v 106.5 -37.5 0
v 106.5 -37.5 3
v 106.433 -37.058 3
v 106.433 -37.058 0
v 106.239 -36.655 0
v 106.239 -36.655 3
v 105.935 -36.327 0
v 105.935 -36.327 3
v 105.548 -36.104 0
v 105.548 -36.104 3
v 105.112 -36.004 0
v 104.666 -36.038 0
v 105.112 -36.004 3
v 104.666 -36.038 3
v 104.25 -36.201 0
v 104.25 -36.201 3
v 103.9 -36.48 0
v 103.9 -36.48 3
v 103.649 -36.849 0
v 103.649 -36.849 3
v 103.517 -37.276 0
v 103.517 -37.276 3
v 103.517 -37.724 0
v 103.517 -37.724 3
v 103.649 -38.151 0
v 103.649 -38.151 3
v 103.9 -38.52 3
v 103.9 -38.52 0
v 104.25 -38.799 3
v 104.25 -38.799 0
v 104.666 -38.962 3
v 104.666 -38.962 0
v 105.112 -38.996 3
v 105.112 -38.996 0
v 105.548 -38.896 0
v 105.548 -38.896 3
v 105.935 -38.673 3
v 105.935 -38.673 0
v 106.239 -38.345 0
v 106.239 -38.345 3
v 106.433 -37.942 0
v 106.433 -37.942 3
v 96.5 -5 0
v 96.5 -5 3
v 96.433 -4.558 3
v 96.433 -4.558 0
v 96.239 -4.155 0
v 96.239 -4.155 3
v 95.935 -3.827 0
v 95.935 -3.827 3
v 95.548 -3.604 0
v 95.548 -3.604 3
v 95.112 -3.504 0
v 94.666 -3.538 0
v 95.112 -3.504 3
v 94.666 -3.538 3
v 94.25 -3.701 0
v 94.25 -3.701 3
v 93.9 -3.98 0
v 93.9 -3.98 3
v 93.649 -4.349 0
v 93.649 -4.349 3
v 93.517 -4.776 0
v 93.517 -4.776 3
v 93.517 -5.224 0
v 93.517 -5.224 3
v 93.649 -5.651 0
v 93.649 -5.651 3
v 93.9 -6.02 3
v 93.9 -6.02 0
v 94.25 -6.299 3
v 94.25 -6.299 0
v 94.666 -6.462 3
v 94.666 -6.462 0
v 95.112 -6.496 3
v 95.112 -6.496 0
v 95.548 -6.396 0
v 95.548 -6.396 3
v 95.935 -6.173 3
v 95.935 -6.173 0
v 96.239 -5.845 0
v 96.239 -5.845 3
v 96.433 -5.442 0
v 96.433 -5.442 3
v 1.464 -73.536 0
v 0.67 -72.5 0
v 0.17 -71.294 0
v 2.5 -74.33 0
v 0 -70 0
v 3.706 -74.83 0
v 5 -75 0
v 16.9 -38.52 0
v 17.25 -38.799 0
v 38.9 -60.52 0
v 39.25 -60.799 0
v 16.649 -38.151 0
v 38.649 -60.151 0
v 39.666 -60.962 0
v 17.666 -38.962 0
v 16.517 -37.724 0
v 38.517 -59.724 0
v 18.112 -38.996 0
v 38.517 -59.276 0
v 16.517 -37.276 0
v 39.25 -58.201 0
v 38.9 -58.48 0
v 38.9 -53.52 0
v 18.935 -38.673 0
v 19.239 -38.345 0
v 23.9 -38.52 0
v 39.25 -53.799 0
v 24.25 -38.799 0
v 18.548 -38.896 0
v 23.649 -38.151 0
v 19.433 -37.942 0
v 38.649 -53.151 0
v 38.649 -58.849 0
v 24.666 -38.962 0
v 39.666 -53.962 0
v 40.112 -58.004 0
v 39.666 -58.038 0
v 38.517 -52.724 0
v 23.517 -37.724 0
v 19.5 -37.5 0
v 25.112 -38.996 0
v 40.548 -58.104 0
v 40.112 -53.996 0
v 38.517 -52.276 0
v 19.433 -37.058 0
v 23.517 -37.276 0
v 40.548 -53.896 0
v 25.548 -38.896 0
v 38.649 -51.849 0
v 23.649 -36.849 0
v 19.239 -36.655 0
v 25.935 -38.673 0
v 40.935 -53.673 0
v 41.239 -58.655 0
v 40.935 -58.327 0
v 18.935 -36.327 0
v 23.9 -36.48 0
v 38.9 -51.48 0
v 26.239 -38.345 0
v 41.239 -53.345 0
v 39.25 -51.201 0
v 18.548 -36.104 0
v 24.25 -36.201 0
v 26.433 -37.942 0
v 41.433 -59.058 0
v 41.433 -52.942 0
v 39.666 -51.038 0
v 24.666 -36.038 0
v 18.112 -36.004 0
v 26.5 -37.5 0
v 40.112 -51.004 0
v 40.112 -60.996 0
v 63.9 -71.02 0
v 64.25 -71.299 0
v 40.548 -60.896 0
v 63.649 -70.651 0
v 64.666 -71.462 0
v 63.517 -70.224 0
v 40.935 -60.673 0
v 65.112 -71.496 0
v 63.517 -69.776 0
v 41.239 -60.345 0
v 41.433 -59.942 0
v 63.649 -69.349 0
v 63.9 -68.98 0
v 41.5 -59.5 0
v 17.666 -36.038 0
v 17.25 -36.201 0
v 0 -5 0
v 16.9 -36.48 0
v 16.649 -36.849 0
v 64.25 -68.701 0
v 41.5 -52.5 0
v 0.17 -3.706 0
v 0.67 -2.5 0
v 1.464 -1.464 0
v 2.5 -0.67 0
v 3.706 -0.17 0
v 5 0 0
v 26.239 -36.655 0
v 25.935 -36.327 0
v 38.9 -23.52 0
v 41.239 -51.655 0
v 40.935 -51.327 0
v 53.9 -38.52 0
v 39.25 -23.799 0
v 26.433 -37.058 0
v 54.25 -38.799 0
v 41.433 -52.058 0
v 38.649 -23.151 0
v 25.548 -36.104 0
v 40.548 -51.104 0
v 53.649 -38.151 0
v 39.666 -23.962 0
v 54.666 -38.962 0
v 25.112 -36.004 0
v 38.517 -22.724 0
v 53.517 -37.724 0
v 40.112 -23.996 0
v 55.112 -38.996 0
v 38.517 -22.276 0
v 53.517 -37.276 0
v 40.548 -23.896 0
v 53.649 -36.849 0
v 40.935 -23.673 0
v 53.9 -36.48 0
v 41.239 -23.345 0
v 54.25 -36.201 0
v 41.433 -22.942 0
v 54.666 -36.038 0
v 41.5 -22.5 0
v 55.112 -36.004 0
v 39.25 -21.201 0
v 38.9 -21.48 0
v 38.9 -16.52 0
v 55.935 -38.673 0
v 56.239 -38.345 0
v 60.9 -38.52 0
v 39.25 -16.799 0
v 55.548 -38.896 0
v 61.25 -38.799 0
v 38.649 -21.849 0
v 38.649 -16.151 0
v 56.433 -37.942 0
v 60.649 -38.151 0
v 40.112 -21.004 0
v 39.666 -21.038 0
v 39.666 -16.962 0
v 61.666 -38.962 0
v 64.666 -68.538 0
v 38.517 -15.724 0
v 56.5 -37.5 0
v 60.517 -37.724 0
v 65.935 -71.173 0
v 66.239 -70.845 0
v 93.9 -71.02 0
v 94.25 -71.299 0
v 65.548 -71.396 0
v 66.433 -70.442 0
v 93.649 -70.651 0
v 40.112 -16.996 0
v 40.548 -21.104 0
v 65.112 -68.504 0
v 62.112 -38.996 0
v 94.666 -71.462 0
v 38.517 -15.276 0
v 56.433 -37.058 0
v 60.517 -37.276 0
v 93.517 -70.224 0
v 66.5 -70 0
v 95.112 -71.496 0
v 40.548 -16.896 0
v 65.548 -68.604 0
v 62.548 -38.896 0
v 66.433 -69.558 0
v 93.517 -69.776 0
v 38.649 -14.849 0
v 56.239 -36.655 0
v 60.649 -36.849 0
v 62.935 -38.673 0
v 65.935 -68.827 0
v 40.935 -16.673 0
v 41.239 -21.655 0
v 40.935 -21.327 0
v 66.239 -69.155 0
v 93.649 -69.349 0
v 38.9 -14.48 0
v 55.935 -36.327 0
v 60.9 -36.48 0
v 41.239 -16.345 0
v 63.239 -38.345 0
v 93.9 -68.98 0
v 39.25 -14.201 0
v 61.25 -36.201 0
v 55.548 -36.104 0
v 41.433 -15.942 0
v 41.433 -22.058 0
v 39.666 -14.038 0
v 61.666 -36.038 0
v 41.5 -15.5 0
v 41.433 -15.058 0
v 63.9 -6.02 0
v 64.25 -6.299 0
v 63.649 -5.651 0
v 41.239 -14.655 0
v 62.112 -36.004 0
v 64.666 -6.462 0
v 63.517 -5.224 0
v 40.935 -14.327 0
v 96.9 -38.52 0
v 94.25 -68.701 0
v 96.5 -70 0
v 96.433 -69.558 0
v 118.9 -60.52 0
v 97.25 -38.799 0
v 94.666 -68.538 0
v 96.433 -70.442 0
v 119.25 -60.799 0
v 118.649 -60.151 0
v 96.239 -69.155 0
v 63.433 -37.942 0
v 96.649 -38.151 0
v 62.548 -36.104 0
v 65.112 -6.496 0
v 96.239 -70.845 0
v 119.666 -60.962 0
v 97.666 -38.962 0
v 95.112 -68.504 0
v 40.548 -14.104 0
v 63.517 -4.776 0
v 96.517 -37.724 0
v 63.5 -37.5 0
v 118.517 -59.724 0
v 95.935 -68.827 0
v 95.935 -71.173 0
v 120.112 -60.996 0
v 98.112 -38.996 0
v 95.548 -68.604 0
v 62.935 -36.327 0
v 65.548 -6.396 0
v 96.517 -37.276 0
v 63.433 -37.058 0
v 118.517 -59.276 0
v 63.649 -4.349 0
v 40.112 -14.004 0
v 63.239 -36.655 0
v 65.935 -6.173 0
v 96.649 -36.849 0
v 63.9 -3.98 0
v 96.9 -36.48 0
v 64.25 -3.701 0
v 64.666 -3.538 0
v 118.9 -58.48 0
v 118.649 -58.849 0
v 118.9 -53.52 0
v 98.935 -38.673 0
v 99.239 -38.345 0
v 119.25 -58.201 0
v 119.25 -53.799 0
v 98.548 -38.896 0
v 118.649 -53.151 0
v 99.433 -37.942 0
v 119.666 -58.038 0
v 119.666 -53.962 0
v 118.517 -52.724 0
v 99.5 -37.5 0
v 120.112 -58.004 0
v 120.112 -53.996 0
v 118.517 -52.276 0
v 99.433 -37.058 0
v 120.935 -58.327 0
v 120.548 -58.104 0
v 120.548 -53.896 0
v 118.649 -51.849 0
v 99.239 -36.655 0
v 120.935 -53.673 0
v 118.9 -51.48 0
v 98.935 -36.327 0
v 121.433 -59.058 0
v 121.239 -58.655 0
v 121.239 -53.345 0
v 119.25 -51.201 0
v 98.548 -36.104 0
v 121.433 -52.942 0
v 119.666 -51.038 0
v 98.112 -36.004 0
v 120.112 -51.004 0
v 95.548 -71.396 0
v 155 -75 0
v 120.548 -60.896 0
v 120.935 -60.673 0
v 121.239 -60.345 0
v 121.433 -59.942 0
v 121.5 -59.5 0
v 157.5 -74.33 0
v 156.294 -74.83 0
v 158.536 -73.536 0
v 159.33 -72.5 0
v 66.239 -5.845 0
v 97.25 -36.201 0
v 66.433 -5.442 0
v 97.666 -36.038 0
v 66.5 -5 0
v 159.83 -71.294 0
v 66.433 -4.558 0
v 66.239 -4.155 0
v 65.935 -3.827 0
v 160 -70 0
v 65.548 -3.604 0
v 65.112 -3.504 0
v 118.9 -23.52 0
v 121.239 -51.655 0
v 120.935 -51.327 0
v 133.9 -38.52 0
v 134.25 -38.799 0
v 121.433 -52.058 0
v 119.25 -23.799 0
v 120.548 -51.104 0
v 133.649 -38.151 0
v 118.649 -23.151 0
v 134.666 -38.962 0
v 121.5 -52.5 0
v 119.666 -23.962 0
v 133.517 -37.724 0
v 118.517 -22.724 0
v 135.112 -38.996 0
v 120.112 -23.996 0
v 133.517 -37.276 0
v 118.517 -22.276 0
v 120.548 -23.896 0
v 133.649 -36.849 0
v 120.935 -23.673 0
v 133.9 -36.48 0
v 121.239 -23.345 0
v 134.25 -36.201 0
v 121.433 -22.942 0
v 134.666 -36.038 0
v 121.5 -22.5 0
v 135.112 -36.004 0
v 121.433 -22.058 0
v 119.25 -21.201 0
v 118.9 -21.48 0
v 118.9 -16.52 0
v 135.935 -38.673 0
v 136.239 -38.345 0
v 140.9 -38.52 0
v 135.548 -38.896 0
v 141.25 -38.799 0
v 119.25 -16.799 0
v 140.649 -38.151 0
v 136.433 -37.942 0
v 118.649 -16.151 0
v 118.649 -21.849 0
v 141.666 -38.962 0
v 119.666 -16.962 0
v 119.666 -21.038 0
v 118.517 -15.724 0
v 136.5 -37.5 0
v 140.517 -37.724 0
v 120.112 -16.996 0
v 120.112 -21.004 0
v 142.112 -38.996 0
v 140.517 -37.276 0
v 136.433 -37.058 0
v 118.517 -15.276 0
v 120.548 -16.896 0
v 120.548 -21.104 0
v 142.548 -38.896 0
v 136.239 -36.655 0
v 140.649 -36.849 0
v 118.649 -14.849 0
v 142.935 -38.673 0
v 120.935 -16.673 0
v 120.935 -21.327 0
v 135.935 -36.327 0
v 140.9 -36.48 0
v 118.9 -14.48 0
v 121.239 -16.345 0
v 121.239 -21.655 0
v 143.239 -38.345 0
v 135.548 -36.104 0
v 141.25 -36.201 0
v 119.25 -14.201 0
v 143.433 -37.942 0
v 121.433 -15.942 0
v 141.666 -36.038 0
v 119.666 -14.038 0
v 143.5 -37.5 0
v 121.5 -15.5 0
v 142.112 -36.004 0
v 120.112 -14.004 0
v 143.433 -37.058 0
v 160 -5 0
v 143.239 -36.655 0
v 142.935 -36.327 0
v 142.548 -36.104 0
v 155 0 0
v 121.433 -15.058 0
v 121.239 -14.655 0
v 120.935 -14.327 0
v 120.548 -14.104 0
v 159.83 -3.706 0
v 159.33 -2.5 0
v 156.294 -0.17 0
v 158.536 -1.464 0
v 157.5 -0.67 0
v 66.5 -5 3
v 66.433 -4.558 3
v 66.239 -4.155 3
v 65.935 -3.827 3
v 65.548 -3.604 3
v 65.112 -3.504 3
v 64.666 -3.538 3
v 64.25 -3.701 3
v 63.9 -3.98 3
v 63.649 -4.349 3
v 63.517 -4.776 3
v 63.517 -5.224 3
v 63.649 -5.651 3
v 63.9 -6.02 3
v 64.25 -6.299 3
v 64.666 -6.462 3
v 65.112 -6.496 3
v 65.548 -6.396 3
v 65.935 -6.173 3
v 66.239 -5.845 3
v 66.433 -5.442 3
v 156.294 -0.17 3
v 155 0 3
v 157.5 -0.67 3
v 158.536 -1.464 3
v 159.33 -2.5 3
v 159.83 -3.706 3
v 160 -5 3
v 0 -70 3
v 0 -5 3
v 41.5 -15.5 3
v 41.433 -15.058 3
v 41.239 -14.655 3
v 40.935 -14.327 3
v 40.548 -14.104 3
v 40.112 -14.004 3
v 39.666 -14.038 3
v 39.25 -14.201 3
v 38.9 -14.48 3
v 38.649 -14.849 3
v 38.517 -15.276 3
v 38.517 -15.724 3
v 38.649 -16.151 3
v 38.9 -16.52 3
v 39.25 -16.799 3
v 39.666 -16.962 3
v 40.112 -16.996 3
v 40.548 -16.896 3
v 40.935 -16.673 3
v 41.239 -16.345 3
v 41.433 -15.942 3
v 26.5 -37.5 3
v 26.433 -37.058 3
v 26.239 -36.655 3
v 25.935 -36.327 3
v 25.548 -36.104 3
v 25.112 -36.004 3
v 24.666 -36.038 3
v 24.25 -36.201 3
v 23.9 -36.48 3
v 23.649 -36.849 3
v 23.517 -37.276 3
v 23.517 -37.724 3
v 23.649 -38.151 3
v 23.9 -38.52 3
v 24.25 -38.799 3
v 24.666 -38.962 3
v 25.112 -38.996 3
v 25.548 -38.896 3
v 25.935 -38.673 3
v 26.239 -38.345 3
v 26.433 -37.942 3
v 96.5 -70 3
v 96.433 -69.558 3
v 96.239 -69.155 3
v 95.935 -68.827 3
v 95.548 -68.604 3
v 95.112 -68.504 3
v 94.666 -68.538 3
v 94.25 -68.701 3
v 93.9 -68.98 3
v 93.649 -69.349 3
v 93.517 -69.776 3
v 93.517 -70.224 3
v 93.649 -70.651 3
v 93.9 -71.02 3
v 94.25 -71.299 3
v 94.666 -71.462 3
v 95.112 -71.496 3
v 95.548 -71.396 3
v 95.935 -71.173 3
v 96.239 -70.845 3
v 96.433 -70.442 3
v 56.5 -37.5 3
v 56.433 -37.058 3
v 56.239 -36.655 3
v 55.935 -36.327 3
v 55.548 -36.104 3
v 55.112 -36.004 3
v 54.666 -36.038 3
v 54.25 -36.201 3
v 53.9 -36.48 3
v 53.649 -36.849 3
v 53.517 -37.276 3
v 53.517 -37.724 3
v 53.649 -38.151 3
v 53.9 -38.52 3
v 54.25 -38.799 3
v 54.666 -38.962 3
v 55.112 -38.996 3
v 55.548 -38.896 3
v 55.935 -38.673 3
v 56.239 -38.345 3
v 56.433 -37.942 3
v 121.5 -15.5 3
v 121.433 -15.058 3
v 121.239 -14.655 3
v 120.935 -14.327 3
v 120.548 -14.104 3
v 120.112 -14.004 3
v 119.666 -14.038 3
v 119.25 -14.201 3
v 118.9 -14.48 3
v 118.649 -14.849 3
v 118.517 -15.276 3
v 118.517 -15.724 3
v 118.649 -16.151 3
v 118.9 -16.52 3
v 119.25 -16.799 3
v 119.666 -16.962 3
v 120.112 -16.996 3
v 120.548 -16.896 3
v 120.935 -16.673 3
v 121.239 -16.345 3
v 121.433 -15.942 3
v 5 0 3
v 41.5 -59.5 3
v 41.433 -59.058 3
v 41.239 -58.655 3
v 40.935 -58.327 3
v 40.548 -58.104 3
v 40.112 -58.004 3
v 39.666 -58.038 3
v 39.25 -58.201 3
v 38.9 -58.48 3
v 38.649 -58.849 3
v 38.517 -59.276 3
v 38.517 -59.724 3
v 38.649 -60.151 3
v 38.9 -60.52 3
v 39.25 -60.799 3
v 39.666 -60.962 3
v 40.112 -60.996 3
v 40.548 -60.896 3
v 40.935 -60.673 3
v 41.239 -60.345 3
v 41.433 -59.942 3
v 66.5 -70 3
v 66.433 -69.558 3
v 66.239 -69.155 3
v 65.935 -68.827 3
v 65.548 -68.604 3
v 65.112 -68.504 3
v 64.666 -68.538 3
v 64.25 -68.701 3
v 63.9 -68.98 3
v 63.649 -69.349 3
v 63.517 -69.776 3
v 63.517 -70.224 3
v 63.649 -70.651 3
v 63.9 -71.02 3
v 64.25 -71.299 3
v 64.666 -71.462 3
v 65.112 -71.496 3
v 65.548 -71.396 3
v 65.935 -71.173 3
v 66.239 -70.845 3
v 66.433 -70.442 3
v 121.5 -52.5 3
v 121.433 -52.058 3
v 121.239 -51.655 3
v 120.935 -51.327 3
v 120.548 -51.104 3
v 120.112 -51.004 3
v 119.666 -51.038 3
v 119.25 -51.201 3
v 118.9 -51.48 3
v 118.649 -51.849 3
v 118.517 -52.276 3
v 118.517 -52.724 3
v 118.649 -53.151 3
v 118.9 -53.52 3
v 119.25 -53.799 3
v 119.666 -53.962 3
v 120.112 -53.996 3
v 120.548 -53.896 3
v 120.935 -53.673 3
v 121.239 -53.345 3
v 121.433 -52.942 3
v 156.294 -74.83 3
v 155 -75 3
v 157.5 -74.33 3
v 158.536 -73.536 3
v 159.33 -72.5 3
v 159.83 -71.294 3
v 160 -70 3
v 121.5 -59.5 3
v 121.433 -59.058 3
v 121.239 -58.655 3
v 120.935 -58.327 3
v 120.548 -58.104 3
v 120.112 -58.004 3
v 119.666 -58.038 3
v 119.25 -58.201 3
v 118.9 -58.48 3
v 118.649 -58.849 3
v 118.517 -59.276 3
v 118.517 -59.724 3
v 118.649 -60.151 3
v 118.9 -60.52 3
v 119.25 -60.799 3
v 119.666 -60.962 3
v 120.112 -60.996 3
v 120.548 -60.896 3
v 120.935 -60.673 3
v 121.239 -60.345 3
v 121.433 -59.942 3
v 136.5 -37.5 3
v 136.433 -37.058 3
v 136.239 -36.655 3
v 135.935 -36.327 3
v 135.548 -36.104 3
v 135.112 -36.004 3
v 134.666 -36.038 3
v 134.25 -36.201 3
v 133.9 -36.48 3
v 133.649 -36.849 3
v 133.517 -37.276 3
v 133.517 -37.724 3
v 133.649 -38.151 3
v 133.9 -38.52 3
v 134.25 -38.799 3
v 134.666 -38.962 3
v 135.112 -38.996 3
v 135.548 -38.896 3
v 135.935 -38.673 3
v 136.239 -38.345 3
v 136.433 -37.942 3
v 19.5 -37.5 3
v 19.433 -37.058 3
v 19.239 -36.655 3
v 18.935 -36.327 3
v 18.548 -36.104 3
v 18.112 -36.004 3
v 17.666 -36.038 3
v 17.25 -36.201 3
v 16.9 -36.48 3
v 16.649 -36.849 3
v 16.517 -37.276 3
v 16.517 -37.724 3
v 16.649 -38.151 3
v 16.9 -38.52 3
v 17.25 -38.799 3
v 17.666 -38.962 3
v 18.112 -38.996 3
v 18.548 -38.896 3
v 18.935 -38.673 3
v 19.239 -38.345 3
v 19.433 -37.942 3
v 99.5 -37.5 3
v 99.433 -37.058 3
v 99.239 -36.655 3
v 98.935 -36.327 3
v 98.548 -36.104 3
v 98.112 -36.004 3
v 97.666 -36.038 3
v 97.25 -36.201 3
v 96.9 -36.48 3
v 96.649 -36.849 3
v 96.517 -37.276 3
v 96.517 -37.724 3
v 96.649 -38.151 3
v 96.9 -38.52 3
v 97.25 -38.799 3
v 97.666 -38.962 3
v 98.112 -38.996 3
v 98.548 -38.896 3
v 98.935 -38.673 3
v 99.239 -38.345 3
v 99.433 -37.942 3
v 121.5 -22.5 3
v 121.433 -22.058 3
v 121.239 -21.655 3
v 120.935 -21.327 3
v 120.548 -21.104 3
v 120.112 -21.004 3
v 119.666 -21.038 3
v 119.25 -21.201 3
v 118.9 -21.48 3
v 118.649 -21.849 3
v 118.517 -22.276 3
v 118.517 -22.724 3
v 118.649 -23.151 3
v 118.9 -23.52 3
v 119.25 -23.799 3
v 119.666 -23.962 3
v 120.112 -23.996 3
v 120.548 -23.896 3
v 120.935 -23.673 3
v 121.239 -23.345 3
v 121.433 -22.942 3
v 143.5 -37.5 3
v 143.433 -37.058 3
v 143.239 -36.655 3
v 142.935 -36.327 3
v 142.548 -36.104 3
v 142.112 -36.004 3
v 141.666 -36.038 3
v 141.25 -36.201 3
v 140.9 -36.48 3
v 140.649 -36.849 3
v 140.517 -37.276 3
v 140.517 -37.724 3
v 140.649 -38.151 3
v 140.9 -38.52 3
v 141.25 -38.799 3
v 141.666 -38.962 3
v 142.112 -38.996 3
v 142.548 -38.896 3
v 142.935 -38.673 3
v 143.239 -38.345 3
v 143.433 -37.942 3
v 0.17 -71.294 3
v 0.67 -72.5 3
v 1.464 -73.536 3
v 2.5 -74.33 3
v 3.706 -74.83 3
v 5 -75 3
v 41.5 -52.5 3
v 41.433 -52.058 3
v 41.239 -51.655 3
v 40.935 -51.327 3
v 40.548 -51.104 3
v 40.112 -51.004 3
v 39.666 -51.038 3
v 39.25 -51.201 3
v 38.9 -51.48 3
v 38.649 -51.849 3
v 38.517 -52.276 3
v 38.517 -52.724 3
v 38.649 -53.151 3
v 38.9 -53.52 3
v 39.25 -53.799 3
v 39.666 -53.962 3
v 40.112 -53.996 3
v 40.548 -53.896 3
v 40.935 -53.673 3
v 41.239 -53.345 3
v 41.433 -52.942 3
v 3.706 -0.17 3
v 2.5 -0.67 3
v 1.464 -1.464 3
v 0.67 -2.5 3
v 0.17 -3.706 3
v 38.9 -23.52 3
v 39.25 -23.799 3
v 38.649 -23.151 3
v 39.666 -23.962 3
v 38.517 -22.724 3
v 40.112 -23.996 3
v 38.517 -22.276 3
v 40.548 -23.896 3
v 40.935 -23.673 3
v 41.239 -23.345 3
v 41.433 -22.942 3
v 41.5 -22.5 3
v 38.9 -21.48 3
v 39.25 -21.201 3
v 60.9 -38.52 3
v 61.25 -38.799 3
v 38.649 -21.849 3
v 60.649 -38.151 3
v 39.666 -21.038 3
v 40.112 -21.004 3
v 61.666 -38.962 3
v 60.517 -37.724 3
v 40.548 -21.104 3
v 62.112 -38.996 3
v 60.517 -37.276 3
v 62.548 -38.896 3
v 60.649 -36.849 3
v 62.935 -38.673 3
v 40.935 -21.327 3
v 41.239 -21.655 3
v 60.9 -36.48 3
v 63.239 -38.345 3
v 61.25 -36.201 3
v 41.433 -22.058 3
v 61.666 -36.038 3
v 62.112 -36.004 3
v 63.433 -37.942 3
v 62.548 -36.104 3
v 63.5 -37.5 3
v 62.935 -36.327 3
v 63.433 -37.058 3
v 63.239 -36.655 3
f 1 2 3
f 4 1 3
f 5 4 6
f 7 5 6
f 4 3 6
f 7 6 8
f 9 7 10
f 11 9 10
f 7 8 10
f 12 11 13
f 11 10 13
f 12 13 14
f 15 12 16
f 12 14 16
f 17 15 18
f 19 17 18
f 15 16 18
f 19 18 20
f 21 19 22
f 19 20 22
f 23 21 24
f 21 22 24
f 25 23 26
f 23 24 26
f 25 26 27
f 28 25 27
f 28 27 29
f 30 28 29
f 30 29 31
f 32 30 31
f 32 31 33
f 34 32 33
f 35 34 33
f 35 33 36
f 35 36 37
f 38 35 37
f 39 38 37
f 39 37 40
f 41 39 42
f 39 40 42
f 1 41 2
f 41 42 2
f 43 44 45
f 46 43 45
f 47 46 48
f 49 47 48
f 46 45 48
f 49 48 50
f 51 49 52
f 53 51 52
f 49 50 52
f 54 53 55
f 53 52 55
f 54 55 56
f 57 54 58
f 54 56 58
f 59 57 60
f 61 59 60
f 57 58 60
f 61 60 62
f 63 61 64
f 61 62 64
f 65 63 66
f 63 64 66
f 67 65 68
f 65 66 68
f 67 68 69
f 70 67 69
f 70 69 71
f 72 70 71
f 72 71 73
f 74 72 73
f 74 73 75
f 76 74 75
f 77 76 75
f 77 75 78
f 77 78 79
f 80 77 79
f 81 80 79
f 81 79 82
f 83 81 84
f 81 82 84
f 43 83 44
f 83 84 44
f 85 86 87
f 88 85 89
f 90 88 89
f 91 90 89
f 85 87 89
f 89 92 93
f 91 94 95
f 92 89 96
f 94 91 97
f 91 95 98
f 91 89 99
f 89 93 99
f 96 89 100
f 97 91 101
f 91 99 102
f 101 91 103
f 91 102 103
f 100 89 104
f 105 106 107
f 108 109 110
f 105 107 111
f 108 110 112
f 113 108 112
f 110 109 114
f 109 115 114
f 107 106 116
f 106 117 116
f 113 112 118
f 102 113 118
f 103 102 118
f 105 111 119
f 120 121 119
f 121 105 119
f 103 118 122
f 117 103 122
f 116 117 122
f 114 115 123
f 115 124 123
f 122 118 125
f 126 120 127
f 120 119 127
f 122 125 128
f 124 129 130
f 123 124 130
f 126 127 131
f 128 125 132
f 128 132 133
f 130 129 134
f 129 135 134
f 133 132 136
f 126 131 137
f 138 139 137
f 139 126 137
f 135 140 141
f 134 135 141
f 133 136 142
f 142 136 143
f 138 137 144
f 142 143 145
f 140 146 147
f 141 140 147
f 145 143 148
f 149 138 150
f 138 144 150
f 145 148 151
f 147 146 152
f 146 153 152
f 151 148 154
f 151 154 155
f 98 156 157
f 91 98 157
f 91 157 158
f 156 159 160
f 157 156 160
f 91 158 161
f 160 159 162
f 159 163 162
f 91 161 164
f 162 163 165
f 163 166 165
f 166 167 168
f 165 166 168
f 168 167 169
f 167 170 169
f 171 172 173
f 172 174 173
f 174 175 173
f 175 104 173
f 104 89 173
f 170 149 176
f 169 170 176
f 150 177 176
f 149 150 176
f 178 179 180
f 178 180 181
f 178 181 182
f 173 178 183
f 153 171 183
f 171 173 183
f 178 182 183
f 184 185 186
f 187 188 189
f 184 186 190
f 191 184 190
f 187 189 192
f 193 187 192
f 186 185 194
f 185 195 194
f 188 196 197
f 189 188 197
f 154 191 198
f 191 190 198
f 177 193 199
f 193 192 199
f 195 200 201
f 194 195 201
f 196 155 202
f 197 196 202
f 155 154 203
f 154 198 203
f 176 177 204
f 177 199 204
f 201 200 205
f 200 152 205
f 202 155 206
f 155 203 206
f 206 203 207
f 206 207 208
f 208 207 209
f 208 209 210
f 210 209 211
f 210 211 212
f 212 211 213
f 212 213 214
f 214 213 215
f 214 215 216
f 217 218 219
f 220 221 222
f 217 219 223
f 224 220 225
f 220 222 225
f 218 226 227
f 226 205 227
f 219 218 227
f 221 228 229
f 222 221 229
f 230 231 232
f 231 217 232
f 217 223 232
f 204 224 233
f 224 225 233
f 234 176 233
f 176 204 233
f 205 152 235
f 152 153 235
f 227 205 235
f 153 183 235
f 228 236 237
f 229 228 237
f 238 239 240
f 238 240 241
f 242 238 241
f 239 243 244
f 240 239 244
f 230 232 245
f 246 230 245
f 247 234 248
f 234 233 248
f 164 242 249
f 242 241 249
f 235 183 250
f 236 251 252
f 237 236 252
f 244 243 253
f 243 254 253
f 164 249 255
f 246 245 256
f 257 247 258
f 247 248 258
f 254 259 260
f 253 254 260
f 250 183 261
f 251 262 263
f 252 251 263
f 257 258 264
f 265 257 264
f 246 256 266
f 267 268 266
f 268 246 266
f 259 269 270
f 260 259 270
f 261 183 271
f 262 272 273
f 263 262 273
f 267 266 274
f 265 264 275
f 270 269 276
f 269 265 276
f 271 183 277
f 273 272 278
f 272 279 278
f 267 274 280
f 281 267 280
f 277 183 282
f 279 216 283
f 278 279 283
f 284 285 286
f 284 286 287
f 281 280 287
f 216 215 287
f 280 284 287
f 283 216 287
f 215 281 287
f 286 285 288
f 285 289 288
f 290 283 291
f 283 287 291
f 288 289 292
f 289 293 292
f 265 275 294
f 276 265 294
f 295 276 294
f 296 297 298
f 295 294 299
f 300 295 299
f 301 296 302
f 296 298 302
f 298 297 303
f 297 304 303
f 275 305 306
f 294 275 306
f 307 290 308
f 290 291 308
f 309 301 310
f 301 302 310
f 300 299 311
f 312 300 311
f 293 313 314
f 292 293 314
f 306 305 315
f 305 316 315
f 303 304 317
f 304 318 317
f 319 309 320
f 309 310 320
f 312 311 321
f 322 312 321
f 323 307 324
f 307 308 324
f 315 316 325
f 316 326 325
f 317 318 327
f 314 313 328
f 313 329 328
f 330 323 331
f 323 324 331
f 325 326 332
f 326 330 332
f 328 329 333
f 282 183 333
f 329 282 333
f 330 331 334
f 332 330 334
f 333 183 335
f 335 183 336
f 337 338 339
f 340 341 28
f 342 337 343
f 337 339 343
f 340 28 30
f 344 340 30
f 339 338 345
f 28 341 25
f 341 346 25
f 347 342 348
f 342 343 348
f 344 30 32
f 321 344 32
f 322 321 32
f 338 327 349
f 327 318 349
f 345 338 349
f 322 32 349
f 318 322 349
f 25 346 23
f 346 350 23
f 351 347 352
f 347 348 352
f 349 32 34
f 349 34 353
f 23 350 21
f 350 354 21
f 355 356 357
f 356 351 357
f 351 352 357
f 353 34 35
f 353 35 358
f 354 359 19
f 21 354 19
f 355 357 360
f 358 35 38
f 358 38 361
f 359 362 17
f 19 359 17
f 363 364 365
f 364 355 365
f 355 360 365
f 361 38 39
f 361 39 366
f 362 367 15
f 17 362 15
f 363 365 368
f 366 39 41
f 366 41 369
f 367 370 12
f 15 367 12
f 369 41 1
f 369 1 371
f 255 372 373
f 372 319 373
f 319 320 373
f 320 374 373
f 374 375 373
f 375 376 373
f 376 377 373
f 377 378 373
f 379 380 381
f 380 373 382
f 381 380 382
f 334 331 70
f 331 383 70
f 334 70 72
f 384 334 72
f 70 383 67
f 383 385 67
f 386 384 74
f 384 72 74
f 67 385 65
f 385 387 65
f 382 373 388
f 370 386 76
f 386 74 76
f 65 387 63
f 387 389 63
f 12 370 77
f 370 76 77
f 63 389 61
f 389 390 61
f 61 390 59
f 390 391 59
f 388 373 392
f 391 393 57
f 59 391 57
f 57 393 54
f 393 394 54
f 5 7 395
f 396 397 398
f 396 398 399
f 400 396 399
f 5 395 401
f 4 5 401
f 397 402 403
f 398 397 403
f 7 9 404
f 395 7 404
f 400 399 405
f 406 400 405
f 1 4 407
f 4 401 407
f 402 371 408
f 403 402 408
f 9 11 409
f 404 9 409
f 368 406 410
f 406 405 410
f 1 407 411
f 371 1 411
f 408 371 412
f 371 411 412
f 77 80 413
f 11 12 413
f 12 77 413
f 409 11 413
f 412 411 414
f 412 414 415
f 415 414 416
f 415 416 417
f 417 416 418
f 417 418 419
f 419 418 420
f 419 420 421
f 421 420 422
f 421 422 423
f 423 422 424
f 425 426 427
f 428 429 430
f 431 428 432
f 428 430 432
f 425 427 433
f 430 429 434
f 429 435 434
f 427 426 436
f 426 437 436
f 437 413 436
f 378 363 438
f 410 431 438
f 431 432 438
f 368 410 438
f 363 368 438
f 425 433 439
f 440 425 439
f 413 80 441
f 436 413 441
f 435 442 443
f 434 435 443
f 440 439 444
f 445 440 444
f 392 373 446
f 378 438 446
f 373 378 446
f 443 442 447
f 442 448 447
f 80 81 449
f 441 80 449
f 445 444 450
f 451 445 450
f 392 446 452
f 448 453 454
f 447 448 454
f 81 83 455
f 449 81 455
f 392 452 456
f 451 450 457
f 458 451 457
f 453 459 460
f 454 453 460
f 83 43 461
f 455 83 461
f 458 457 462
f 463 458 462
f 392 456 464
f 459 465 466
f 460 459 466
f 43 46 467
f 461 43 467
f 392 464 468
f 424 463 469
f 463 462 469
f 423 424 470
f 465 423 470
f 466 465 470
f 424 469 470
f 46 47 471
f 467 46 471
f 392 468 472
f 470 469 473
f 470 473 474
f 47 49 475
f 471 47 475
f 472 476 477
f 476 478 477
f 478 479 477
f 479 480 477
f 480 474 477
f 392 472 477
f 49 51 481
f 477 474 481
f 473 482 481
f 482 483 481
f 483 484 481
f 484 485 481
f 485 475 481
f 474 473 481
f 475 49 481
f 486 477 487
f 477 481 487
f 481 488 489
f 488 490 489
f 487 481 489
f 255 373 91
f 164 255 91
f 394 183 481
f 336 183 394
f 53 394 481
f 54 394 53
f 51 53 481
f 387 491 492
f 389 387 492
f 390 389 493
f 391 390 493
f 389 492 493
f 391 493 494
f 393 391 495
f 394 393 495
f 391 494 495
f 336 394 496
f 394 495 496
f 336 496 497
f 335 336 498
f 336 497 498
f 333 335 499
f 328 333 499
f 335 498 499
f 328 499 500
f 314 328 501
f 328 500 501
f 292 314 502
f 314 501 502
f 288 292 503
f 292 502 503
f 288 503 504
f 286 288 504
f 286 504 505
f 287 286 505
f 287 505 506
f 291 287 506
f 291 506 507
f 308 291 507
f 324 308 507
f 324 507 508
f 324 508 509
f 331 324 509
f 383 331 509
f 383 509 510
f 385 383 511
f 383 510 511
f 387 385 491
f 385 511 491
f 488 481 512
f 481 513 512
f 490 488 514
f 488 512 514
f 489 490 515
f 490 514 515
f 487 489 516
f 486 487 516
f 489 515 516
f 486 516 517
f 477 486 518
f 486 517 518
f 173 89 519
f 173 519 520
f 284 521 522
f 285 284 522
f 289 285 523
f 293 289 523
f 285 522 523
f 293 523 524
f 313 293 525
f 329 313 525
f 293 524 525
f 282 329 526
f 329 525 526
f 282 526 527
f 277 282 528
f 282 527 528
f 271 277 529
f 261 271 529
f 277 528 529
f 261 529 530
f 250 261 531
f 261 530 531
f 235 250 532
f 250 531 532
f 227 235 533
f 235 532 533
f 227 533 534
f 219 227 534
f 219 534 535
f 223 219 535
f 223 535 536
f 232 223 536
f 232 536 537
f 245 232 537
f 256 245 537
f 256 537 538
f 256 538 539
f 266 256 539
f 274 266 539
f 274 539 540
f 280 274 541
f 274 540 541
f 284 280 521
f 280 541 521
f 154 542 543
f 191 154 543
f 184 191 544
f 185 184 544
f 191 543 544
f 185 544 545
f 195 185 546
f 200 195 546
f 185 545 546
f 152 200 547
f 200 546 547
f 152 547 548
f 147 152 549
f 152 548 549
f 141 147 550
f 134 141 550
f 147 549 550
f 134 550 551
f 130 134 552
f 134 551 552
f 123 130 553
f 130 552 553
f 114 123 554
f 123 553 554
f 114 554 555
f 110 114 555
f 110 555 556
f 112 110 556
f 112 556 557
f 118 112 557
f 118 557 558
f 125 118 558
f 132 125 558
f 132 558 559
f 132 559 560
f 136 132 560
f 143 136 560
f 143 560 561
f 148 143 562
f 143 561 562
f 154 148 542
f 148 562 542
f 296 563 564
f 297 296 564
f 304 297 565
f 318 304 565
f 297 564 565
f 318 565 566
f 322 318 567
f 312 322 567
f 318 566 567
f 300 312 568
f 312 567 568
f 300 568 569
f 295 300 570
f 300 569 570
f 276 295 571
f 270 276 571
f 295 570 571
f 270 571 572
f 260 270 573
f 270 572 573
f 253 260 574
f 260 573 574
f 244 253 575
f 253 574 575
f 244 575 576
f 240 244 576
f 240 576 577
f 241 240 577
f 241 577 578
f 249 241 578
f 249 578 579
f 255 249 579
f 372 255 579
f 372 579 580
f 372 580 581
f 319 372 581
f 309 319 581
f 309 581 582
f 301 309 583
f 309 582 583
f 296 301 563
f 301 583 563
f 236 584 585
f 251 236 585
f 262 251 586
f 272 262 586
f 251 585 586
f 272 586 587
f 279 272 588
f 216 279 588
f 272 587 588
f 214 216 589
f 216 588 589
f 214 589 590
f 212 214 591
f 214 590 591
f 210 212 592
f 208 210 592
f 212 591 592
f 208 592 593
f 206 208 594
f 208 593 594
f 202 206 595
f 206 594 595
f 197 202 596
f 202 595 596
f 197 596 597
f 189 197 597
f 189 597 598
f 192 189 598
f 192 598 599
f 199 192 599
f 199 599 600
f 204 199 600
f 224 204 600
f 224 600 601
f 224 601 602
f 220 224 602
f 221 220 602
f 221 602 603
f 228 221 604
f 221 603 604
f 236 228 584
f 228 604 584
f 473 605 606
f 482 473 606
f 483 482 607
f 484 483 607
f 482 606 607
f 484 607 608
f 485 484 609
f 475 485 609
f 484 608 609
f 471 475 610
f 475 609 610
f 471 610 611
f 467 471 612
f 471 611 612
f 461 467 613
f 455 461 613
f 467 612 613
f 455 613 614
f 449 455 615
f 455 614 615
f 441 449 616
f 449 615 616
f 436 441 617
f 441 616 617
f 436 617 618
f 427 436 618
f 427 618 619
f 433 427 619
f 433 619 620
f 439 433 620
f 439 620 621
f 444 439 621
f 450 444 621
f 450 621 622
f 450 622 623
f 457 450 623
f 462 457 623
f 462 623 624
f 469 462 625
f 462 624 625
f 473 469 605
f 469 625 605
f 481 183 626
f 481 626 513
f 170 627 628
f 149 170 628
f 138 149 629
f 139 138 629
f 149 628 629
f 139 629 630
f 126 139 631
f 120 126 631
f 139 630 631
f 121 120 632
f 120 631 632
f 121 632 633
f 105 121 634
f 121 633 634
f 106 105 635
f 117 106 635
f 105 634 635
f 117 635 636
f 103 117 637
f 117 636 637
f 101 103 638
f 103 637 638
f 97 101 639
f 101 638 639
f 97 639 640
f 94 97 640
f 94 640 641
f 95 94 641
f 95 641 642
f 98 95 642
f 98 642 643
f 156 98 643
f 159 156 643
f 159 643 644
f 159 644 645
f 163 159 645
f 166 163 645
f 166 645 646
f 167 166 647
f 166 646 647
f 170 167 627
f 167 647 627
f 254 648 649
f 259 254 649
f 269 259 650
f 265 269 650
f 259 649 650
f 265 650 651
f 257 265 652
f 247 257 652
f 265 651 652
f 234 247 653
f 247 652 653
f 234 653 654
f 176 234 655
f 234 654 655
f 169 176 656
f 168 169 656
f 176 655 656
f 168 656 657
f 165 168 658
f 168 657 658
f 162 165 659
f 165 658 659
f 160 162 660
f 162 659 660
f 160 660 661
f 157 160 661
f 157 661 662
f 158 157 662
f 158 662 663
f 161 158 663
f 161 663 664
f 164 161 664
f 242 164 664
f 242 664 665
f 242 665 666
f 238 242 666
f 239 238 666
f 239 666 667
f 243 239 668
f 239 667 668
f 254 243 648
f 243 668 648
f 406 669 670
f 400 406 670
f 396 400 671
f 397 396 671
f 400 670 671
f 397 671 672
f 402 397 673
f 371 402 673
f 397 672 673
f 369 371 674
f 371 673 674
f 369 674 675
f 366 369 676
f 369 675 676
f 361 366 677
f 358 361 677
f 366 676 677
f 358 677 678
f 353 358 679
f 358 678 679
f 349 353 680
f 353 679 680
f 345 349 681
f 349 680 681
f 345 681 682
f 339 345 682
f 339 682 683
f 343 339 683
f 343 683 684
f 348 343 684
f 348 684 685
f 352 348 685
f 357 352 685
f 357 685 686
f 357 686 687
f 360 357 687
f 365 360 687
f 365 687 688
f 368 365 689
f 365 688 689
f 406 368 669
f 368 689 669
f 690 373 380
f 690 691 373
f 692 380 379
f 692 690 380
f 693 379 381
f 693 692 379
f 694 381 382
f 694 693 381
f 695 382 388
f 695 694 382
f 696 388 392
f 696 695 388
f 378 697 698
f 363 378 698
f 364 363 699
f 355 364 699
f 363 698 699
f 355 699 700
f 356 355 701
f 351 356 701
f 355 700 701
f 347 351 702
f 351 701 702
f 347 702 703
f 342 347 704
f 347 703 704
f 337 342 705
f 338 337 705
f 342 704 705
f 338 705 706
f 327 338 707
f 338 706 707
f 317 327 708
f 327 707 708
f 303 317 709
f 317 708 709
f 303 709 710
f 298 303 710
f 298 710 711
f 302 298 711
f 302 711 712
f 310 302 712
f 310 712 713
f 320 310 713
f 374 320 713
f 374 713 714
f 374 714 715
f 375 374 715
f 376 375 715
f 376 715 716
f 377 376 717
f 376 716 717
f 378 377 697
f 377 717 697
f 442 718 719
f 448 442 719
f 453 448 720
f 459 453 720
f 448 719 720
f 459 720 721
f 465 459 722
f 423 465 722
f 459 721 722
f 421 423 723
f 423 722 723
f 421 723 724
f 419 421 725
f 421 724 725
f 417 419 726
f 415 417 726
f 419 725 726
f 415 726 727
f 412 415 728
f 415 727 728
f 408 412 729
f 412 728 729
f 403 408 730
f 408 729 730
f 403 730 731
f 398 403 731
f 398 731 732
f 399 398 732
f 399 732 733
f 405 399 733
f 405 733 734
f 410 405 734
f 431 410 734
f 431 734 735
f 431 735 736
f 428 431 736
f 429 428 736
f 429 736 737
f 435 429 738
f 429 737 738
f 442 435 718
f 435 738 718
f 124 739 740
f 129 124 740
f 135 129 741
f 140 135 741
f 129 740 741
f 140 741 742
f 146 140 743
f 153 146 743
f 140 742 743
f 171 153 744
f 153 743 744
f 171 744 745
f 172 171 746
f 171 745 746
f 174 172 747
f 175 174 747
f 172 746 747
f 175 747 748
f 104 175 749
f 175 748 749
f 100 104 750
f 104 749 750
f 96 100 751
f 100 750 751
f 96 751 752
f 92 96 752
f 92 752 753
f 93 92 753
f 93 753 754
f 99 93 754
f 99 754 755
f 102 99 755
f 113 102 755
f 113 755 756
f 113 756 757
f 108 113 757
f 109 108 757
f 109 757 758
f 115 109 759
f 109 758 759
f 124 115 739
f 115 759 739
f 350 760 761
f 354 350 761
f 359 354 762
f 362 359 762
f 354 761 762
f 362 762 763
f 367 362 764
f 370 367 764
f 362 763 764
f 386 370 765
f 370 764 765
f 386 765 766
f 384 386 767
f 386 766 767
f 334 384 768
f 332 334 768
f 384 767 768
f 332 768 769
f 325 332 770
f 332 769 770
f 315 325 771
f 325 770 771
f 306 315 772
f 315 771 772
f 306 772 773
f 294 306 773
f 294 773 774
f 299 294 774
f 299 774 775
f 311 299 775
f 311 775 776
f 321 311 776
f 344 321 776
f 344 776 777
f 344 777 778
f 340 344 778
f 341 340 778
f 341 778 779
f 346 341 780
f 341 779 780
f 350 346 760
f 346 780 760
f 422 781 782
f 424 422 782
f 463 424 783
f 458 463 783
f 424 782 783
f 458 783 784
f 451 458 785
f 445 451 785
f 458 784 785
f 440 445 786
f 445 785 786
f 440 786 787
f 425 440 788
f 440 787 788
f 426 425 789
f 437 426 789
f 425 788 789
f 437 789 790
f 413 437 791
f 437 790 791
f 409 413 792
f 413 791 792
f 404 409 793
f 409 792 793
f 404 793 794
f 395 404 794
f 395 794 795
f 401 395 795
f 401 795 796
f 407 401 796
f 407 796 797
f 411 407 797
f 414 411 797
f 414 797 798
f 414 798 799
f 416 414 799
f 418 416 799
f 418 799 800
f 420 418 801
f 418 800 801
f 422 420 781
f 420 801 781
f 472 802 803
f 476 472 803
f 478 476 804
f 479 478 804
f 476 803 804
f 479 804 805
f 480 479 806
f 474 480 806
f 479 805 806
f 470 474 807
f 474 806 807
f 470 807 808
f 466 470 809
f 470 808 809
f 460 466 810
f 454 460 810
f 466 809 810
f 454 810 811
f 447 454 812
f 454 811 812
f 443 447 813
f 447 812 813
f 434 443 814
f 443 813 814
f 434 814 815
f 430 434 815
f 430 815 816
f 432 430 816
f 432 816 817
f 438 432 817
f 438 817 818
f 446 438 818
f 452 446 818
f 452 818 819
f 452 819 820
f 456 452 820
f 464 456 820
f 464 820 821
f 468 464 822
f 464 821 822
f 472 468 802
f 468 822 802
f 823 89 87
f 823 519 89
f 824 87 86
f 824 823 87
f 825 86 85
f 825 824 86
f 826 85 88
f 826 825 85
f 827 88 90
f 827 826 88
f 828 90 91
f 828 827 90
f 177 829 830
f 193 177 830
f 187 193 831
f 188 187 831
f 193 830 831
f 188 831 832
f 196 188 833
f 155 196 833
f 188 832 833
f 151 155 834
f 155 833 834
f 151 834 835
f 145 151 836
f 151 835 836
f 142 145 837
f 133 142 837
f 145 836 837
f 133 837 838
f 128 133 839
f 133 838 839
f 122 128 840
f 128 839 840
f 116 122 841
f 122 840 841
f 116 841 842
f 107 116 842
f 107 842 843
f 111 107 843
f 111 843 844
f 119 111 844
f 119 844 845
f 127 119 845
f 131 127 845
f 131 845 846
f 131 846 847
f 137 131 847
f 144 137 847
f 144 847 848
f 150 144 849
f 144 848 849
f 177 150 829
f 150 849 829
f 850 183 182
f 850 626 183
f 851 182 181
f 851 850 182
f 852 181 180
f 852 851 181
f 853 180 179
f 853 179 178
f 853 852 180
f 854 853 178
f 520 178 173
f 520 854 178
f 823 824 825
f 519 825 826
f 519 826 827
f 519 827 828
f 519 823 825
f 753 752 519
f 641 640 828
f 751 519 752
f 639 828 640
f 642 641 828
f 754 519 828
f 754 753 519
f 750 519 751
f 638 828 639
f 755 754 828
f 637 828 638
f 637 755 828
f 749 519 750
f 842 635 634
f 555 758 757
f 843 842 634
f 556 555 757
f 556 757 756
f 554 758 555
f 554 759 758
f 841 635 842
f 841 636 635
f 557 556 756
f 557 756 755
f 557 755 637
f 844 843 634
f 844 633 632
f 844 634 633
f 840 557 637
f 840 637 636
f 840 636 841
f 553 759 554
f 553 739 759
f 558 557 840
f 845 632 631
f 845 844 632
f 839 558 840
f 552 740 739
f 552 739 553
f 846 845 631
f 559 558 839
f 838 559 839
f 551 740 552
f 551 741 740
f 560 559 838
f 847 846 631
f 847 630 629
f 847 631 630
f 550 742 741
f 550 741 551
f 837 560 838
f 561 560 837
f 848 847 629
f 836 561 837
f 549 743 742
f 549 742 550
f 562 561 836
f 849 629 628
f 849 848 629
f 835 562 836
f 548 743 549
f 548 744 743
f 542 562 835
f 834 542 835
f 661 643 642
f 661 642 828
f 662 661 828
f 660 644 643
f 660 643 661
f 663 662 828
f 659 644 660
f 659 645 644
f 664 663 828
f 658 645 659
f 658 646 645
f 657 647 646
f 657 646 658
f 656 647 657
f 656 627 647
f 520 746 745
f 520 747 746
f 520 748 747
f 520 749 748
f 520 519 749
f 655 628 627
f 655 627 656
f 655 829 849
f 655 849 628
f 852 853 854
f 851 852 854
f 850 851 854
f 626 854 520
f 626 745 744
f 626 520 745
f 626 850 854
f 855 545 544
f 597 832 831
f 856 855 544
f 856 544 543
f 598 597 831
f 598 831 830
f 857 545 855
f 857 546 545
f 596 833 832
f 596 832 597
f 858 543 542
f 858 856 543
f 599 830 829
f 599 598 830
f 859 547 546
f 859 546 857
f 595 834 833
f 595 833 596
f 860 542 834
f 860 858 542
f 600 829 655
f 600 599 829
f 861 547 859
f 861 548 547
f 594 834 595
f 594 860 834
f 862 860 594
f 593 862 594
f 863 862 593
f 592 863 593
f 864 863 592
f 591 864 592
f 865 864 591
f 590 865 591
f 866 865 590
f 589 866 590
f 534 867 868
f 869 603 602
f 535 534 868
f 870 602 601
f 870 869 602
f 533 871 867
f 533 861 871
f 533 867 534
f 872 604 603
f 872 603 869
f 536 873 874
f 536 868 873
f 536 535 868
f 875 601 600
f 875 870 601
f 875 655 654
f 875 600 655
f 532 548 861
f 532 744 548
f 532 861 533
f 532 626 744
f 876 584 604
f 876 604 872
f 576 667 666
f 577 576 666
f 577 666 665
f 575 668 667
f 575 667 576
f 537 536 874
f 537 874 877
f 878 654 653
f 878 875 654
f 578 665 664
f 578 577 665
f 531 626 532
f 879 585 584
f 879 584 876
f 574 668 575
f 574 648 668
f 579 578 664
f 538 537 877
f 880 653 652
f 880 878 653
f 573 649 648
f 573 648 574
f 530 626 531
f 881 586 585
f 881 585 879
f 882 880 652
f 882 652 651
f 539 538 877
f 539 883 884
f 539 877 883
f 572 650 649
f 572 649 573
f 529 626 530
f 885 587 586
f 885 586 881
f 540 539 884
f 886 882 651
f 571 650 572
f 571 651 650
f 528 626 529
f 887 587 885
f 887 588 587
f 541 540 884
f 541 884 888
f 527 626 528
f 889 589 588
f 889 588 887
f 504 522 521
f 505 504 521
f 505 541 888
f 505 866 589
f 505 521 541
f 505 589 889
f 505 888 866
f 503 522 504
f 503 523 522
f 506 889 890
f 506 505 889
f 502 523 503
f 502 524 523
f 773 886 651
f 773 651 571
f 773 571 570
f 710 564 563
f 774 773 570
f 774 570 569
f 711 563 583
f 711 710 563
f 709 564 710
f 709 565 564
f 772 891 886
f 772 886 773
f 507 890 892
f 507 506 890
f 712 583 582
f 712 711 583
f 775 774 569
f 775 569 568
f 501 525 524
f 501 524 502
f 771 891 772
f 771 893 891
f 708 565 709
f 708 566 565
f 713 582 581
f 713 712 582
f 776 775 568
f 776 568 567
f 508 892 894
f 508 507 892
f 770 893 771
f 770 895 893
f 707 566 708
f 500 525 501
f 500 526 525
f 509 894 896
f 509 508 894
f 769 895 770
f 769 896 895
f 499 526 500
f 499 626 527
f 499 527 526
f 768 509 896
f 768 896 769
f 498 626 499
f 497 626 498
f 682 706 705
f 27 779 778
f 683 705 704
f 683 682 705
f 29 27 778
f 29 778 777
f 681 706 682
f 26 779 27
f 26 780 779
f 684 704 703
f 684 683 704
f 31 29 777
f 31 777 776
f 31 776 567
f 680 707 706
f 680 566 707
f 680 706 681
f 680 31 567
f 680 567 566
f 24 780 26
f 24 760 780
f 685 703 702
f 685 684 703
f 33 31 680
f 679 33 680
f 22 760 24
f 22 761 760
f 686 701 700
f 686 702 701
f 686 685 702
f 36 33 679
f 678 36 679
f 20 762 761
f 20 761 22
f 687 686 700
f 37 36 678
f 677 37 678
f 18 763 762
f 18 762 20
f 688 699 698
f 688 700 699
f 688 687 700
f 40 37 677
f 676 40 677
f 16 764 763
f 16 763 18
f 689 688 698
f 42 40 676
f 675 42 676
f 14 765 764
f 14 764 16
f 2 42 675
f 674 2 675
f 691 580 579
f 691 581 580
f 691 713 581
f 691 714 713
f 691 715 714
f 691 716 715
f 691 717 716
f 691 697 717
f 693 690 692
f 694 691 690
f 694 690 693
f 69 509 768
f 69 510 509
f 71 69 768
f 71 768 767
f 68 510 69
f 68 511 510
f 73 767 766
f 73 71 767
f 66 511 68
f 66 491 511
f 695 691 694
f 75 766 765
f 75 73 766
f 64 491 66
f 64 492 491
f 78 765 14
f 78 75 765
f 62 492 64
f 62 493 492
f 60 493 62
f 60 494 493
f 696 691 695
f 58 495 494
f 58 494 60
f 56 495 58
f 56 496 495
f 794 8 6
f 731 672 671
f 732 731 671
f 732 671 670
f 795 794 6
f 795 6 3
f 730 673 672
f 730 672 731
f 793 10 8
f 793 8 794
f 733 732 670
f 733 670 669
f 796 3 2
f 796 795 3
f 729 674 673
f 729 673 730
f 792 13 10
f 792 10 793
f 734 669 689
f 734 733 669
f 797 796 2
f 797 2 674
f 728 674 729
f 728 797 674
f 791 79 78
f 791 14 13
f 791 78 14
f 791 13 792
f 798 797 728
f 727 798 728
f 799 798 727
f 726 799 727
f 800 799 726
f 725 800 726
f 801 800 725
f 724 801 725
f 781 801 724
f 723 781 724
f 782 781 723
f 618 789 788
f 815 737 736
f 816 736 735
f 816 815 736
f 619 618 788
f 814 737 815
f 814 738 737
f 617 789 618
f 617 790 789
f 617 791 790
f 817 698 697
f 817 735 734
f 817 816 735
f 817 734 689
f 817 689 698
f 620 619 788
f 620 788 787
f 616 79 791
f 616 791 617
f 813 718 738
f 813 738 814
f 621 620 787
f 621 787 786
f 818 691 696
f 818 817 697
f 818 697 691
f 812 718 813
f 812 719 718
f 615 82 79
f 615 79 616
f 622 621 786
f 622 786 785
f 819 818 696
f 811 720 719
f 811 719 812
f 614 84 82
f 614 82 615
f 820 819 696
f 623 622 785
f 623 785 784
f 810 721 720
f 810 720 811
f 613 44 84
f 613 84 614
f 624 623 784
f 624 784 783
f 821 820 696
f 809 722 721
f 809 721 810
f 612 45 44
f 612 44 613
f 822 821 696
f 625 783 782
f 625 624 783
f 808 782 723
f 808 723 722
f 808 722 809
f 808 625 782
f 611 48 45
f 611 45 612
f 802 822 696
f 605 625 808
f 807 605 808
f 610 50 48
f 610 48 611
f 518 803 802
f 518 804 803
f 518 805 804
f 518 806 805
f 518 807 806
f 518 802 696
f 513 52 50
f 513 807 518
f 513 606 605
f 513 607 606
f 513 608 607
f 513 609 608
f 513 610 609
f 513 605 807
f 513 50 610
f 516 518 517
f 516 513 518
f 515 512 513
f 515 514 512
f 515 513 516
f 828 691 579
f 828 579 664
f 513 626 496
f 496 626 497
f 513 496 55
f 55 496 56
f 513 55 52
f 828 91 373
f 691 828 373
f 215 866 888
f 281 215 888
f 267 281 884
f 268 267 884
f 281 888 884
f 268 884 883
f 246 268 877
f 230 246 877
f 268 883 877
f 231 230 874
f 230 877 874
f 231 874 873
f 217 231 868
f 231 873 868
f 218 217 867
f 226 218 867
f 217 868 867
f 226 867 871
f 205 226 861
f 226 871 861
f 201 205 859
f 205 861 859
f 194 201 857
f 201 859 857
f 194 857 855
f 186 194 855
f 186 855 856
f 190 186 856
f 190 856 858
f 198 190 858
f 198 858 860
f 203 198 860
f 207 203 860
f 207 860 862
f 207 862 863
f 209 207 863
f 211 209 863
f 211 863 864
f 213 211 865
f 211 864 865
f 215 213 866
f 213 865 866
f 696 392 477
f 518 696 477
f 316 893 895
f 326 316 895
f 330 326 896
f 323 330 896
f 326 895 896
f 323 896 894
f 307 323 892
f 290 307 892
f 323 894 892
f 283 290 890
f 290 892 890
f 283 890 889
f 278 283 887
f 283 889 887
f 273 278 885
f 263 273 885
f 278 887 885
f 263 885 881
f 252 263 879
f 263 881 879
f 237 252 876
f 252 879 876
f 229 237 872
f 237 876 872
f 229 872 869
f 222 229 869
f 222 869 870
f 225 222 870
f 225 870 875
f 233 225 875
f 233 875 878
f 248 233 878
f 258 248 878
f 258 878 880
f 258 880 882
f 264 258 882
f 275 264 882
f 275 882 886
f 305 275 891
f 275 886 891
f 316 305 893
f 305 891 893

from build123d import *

# Parameters (mm, degrees)
SKETCH_1_W          = 160
SKETCH_1_H          = 75
EXTRUDE_1_DEPTH     = 3
SKETCH_4_R          = 1.5
CUT_EXTRUDE_1_DEPTH = 3
SKETCH_5_R          = 1.5
CUT_EXTRUDE_2_DEPTH = 3
SKETCH_6_R          = 1.5
CUT_EXTRUDE_3_DEPTH = 3
FILLET_1_R          = 5
FILLET_2_R          = 5
FILLET_3_R          = 5
FILLET_4_R          = 5


with BuildPart() as part:
    # 草图1 → 凸台-拉伸1 (new body)
    with BuildSketch(Plane.XY):
        with Locations((80, -37.5)):
            Rectangle(SKETCH_1_W, SKETCH_1_H)
    extrude(amount=EXTRUDE_1_DEPTH)

    # 草图4 → 切除-拉伸1 (cut)
    with BuildSketch(Plane.XY.offset(3)):
        with Locations((40, -15.5)):
            Circle(SKETCH_4_R)
        with Locations((18, -37.5)):
            Circle(SKETCH_4_R)
        with Locations((62, -37.5)):
            Circle(SKETCH_4_R)
        with Locations((40, -59.5)):
            Circle(SKETCH_4_R)
        with Locations((40, -22.5)):
            Circle(SKETCH_4_R)
        with Locations((25, -37.5)):
            Circle(SKETCH_4_R)
        with Locations((55, -37.5)):
            Circle(SKETCH_4_R)
        with Locations((40, -52.5)):
            Circle(SKETCH_4_R)
    extrude(amount=-CUT_EXTRUDE_1_DEPTH, mode=Mode.SUBTRACT)

    # 草图5 → 切除-拉伸2 (cut)
    with BuildSketch(Plane.XY.offset(3)):
        with Locations((120, -15.5)):
            Circle(SKETCH_5_R)
        with Locations((98, -37.5)):
            Circle(SKETCH_5_R)
        with Locations((120, -59.5)):
            Circle(SKETCH_5_R)
        with Locations((142, -37.5)):
            Circle(SKETCH_5_R)
        with Locations((120, -22.5)):
            Circle(SKETCH_5_R)
        with Locations((105, -37.5)):
            Circle(SKETCH_5_R)
        with Locations((120, -52.5)):
            Circle(SKETCH_5_R)
        with Locations((135, -37.5)):
            Circle(SKETCH_5_R)
    extrude(amount=-CUT_EXTRUDE_2_DEPTH, mode=Mode.SUBTRACT)

    # 草图6 → 切除-拉伸3 (cut)
    with BuildSketch(Plane.XY.offset(3)):
        with Locations((65, -5)):
            Circle(SKETCH_6_R)
        with Locations((95, -5)):
            Circle(SKETCH_6_R)
        with Locations((65, -70)):
            Circle(SKETCH_6_R)
        with Locations((95, -70)):
            Circle(SKETCH_6_R)
    extrude(amount=-CUT_EXTRUDE_3_DEPTH, mode=Mode.SUBTRACT)

    # 圆角1
    fillet_1_edges = [part.edges().sort_by_distance(p)[0] for p in [
        (160, 0, 1.5),
    ]]
    fillet(fillet_1_edges, radius=FILLET_1_R)

    # 圆角2
    fillet_2_edges = [part.edges().sort_by_distance(p)[0] for p in [
        (0, 0, 1.5),
    ]]
    fillet(fillet_2_edges, radius=FILLET_2_R)

    # 圆角3
    fillet_3_edges = [part.edges().sort_by_distance(p)[0] for p in [
        (0, -75, 1.5),
    ]]
    fillet(fillet_3_edges, radius=FILLET_3_R)

    # 圆角4
    fillet_4_edges = [part.edges().sort_by_distance(p)[0] for p in [
        (160, -75, 1.5),
    ]]
    fillet(fillet_4_edges, radius=FILLET_4_R)


solid = part.part
